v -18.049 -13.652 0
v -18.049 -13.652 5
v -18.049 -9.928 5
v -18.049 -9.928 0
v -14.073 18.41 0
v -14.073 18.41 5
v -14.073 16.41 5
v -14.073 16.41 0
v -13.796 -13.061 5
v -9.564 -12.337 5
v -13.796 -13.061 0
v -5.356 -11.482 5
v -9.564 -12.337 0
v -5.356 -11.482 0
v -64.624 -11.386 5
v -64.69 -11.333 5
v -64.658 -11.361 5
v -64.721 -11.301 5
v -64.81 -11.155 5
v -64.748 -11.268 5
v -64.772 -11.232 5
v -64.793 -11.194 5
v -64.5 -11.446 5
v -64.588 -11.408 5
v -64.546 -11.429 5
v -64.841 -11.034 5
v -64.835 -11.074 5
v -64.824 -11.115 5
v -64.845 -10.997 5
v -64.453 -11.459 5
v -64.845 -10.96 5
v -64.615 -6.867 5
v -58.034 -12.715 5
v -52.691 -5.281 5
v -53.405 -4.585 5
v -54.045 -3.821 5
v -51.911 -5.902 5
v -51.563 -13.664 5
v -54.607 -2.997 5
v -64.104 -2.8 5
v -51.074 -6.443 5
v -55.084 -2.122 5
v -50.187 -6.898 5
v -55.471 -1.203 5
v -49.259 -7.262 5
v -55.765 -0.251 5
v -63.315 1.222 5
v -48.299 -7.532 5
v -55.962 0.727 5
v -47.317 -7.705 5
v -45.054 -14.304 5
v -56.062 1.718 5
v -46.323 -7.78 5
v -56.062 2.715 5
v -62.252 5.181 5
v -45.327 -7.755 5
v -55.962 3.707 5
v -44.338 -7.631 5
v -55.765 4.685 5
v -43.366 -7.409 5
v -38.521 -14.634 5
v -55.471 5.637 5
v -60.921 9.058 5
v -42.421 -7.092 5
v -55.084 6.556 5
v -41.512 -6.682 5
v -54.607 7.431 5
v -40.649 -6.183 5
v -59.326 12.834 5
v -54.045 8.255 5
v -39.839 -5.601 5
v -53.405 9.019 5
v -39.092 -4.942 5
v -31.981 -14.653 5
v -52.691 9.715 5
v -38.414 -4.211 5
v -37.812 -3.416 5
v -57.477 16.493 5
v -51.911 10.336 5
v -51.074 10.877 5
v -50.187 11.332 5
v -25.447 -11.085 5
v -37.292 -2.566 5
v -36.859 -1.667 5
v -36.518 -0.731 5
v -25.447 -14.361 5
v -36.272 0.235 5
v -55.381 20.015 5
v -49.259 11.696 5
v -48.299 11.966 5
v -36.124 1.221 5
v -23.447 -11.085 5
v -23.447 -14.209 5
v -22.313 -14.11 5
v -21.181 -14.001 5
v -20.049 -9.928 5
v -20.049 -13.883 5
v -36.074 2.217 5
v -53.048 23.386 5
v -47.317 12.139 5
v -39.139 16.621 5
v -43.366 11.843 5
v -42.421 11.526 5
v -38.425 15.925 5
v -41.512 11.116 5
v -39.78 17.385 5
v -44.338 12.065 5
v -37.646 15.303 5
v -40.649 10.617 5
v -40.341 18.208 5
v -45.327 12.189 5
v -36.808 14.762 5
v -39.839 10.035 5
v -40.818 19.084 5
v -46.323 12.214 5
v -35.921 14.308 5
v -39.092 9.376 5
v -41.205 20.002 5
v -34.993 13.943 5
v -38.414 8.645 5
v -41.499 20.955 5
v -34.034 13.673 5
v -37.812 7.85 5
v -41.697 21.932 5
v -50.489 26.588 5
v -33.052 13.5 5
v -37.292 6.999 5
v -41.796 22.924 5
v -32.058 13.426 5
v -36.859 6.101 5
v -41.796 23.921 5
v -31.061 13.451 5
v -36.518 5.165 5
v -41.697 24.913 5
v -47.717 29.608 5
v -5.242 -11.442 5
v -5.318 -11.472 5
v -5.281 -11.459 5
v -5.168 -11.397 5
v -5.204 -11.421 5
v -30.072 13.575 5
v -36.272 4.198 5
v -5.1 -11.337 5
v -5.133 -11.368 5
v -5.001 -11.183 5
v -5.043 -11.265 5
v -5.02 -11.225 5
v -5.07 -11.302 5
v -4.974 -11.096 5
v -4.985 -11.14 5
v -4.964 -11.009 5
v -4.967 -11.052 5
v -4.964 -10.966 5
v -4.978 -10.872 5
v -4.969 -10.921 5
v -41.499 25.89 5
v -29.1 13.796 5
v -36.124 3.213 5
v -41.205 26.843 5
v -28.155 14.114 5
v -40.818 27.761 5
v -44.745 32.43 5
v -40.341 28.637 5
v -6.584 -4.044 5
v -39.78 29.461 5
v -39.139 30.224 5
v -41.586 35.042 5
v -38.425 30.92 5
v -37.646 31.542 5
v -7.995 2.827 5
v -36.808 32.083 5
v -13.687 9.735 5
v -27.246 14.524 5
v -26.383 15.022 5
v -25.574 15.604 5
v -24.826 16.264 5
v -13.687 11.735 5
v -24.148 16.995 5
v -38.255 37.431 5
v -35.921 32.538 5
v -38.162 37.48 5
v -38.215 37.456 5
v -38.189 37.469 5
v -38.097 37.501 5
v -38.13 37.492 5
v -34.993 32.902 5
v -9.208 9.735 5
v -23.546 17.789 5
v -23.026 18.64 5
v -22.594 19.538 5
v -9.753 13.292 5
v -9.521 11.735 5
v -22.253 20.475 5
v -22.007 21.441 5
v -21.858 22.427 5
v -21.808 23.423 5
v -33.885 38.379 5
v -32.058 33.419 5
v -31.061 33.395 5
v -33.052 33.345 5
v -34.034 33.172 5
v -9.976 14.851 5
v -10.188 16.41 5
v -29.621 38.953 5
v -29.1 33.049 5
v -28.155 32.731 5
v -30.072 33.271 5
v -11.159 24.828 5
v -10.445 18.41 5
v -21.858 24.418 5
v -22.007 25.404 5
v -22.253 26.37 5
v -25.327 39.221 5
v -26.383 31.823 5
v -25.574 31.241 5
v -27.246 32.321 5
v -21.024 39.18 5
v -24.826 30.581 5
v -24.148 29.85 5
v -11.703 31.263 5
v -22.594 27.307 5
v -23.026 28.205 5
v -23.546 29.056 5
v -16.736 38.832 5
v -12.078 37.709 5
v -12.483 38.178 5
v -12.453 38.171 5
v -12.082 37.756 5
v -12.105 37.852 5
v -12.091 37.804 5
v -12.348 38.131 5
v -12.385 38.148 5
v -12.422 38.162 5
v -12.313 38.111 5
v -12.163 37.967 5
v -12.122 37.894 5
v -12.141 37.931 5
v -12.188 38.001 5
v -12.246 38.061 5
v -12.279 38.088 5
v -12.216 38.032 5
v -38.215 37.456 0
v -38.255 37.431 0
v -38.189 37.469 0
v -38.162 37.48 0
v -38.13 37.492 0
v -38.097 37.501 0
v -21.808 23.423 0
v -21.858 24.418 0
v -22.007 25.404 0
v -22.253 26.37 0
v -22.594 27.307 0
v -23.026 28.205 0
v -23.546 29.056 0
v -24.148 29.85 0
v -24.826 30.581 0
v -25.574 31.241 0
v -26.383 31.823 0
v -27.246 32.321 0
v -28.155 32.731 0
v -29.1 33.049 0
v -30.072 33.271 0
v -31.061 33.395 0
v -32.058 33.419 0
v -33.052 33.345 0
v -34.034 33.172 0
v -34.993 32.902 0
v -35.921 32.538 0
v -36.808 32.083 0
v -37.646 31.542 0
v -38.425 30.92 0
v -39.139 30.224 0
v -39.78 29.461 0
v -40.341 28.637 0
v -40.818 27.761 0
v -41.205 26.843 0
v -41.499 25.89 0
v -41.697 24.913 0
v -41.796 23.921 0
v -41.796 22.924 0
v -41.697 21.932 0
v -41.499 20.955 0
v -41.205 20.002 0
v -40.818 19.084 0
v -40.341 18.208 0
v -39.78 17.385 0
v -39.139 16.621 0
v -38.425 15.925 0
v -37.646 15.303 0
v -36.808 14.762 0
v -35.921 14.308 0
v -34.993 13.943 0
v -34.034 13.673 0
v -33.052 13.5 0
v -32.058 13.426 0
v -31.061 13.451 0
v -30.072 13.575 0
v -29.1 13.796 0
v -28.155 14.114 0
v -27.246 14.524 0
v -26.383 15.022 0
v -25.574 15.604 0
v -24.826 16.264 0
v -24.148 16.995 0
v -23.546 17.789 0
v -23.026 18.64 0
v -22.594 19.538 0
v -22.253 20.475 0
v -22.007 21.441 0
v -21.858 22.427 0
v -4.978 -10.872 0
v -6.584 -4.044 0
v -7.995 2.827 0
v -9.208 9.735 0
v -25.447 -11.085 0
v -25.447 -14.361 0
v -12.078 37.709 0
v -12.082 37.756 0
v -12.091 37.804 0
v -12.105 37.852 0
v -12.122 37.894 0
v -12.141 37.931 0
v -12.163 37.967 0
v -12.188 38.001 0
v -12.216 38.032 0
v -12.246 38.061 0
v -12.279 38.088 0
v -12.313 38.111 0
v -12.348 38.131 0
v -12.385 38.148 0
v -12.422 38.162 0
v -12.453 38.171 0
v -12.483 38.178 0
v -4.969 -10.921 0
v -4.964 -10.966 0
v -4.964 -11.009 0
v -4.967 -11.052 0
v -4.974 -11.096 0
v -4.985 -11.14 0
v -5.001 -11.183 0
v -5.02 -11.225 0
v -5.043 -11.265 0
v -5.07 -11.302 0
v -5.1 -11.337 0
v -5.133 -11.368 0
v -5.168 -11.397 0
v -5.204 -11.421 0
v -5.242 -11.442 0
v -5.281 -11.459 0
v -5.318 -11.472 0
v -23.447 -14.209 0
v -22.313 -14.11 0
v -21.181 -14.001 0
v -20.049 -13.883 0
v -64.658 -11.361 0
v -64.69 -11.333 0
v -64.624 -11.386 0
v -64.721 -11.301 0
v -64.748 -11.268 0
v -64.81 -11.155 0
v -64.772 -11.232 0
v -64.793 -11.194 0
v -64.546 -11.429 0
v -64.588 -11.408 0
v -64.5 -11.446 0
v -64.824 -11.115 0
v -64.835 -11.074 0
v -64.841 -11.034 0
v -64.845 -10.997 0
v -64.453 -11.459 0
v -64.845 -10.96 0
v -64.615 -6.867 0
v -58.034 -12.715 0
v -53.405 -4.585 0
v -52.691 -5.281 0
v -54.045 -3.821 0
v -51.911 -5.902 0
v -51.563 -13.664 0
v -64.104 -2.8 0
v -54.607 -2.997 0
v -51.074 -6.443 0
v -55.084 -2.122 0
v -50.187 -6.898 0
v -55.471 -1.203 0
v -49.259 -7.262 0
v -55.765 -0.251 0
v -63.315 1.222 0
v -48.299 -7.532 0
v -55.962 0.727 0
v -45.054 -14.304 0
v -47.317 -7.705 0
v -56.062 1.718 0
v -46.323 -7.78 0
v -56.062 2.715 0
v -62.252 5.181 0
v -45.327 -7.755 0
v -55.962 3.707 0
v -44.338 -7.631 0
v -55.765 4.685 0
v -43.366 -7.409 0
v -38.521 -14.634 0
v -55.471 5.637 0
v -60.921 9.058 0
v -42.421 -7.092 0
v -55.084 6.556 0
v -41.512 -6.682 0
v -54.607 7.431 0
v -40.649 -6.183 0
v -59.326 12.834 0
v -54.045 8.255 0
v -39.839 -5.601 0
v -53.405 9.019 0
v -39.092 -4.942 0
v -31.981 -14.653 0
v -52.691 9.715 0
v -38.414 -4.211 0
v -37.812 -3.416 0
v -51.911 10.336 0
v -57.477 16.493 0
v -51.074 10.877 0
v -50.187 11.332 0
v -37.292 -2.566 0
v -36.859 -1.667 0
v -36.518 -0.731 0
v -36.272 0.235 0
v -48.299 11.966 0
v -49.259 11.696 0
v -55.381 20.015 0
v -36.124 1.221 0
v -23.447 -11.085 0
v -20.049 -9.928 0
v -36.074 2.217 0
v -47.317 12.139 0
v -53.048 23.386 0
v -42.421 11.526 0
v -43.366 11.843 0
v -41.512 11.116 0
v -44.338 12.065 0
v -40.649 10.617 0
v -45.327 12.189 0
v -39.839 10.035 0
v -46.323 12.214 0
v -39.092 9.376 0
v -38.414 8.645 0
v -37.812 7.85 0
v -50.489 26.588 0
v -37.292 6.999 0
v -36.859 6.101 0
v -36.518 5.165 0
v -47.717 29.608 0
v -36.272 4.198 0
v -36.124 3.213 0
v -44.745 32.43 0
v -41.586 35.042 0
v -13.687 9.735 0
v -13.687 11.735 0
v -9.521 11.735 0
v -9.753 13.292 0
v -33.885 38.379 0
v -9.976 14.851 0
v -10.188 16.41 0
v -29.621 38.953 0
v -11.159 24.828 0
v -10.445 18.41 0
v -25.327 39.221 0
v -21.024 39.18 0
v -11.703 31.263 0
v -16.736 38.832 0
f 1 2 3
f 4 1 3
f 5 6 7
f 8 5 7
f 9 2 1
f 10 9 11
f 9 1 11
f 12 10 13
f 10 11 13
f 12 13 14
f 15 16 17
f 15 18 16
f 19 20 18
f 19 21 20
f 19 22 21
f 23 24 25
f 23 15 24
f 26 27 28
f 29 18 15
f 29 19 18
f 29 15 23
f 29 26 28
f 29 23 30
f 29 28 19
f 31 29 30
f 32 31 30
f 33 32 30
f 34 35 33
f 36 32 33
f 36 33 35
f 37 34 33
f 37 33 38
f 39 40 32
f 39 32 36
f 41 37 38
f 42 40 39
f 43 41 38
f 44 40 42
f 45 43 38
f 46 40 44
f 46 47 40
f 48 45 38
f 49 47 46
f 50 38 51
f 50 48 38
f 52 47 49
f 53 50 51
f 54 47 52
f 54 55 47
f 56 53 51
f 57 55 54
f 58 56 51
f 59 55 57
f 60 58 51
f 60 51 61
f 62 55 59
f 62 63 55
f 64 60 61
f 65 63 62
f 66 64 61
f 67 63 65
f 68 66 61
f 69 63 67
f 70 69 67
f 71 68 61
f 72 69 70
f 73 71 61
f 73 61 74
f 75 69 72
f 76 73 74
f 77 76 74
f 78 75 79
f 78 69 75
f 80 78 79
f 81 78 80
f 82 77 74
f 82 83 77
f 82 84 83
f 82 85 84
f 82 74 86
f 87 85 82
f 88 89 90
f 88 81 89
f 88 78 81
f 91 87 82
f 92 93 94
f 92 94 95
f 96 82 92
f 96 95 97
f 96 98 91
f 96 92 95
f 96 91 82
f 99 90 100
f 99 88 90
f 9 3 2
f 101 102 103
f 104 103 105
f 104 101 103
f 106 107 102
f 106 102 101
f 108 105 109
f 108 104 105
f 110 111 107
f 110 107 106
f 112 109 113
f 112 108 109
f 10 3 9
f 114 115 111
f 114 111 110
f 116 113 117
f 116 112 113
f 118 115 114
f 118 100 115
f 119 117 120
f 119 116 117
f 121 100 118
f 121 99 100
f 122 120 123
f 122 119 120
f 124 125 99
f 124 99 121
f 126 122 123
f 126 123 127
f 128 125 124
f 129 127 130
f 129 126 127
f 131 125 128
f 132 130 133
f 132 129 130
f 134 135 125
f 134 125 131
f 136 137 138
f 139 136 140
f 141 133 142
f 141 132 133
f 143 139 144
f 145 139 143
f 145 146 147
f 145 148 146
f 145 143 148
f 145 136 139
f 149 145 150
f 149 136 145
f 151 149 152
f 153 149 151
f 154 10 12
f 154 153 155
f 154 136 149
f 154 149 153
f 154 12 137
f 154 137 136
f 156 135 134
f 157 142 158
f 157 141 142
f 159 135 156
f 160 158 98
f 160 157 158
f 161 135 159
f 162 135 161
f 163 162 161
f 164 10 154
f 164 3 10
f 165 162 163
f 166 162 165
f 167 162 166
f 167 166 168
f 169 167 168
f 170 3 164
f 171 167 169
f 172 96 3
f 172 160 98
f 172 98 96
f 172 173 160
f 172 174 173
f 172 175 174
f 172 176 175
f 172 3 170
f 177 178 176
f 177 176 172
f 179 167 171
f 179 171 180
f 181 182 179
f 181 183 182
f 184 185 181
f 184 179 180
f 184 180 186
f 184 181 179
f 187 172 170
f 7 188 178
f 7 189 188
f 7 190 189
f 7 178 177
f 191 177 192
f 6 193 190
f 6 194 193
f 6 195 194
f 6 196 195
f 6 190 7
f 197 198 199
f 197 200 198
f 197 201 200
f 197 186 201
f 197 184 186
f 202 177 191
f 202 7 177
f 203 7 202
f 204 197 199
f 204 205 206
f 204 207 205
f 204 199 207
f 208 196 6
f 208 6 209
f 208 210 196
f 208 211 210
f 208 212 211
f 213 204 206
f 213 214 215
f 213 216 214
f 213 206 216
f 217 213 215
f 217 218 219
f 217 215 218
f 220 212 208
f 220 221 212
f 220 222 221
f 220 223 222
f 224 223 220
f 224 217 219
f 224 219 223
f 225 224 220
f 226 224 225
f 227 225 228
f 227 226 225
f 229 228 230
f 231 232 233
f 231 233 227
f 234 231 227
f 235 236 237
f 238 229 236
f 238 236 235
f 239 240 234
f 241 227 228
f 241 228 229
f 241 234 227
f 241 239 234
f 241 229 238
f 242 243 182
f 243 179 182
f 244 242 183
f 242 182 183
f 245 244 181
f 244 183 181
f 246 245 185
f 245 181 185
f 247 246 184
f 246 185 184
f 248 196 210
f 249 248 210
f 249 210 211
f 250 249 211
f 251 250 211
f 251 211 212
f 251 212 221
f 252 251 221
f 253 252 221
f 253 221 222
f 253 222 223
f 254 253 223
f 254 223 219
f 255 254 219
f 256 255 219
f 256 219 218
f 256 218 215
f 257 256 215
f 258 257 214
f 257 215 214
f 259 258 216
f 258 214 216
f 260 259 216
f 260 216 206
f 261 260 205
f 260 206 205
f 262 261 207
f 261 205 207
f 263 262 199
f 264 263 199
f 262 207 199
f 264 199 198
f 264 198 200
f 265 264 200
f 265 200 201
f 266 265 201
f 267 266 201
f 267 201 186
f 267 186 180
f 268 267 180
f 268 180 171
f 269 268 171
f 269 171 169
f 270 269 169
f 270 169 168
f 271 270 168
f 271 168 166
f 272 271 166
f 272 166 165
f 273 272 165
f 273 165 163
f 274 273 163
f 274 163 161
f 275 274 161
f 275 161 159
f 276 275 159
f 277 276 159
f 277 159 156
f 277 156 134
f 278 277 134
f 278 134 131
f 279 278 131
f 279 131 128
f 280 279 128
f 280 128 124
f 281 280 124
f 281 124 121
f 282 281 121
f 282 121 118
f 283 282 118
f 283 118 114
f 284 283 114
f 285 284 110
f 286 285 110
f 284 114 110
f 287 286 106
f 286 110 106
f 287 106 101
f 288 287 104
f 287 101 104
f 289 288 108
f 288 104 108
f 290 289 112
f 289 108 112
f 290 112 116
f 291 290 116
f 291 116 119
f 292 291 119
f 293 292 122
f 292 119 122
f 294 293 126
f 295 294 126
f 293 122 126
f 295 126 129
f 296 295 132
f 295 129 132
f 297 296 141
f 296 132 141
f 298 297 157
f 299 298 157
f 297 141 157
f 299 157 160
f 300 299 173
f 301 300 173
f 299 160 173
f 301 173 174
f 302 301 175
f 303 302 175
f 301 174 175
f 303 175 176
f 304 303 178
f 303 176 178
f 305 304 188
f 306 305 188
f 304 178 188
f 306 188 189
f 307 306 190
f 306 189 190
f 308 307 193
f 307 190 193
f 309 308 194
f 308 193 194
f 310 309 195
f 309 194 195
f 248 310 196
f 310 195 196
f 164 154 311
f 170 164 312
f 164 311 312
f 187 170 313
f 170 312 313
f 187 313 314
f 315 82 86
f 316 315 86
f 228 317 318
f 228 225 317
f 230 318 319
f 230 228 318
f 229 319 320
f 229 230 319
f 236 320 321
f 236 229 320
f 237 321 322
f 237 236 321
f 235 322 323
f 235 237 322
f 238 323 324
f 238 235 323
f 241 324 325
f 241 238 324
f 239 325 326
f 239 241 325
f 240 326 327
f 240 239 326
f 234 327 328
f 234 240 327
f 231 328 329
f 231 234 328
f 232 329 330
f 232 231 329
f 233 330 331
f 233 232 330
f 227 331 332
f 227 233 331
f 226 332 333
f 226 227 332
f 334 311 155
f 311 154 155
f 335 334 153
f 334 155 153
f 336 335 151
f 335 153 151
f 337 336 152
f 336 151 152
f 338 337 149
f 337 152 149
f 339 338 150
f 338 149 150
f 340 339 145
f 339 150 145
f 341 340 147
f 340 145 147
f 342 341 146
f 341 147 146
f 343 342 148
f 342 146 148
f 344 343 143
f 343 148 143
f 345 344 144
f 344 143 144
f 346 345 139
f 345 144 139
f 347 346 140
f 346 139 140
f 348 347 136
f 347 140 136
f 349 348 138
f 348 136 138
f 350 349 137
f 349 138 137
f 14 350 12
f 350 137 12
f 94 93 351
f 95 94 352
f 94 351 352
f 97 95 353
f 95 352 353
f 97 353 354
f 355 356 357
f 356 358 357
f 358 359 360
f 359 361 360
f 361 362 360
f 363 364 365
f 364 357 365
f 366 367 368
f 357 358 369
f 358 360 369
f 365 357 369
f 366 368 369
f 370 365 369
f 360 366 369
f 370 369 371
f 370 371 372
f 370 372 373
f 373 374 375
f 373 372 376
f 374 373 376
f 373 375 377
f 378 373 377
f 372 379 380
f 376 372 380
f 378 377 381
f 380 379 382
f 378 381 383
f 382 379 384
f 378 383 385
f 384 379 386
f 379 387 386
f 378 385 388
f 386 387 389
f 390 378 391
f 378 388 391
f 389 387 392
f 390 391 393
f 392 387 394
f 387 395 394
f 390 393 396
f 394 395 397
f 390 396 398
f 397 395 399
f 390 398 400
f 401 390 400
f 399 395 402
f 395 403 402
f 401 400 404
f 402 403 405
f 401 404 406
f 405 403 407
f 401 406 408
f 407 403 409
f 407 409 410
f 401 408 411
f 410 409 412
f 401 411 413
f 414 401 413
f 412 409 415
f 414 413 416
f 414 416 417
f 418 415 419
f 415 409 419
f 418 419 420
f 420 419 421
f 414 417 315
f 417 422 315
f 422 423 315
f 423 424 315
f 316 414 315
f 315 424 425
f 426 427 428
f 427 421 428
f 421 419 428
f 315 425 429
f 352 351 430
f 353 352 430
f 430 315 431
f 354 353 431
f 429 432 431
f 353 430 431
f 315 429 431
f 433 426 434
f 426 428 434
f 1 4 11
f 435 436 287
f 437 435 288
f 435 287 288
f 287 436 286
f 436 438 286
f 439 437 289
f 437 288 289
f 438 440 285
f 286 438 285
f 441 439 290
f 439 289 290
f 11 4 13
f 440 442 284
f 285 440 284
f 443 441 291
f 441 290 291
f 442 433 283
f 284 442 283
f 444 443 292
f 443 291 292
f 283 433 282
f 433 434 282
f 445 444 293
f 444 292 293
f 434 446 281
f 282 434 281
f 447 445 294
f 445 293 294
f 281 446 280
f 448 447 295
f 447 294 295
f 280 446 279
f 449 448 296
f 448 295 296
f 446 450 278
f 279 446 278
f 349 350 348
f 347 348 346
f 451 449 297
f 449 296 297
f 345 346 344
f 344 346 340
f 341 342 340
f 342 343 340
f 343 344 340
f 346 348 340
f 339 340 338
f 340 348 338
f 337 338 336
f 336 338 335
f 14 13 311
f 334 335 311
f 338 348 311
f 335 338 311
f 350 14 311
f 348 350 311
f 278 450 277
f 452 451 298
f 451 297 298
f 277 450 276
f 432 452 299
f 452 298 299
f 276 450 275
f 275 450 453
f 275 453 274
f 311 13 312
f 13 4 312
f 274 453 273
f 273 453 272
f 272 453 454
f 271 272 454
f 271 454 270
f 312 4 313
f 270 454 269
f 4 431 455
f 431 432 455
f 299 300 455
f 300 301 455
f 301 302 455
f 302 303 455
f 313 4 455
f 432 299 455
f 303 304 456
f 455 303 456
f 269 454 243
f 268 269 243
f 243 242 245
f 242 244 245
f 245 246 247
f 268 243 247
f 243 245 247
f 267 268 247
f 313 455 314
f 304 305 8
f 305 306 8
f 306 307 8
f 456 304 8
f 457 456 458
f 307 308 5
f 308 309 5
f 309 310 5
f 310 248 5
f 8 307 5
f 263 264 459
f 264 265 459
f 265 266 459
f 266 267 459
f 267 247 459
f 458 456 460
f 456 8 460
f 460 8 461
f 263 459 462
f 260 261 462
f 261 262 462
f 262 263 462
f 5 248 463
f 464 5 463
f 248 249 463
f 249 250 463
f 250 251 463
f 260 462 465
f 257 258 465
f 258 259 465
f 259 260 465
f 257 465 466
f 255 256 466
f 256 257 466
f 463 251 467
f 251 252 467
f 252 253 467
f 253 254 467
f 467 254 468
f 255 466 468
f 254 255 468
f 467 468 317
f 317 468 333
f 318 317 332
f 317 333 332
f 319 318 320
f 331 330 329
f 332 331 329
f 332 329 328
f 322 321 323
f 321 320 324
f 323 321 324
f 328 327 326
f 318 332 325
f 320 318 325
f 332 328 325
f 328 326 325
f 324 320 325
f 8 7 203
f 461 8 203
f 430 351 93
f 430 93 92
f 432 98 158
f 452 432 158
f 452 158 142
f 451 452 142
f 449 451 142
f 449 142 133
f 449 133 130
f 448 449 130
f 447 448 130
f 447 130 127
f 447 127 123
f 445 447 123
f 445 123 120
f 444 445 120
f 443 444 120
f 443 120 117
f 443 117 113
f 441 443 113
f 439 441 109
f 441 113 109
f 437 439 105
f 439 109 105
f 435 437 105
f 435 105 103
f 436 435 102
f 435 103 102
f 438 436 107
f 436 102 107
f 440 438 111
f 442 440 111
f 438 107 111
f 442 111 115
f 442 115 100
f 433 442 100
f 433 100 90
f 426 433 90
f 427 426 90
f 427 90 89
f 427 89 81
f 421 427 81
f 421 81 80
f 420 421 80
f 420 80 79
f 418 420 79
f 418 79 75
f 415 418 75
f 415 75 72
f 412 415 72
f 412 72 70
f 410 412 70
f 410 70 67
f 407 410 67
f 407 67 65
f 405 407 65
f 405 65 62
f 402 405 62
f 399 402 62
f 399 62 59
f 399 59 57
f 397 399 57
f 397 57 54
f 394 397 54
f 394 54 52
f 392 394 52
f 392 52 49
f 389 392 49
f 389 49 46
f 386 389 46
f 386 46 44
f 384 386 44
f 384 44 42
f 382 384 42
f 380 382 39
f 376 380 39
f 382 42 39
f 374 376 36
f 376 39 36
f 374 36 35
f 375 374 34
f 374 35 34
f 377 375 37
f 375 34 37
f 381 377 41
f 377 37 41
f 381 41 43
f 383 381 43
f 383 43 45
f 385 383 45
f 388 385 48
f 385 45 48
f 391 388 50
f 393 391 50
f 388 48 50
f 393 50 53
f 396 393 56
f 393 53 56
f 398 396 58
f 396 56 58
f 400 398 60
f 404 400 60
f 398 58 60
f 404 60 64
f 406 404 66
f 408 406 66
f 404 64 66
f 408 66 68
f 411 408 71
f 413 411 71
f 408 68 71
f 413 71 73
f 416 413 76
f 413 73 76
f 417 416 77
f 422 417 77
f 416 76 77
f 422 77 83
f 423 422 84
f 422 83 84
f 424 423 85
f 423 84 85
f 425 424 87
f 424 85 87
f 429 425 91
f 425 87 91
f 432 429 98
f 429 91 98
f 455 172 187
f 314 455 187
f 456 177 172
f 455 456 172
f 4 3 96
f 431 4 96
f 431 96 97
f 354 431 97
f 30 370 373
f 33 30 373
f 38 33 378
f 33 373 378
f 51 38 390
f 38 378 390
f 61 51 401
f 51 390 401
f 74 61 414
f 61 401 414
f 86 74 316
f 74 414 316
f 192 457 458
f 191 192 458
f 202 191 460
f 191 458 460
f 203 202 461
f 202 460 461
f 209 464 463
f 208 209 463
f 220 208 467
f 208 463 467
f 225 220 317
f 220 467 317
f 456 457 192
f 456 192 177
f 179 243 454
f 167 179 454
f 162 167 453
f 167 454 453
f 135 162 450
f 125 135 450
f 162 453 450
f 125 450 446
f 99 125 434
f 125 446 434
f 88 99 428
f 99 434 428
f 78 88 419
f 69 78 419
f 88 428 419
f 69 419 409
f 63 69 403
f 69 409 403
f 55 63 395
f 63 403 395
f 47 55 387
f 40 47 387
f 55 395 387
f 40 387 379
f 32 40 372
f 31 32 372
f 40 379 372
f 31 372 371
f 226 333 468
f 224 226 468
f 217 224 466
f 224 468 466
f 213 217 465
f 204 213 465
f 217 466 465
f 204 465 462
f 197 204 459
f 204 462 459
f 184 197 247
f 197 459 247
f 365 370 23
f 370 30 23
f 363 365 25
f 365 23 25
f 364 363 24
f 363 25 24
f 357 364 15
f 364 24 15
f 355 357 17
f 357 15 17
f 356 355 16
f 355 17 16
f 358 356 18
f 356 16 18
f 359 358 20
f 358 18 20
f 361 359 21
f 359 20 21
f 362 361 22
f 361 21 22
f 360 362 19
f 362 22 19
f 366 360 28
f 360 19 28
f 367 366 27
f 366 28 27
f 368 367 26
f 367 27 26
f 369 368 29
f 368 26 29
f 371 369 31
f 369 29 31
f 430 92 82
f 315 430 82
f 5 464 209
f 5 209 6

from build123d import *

# Parameters (mm, degrees)
F1_DEPTH = 5
F3_DEPTH = 25
F5_R     = 10
F6_DEPTH = 40.2
F7_R     = 0.5


with BuildPart() as f1:
    # F0 (on Top) → F1 (new body)
    with BuildSketch(Plane.XY):
        with BuildLine():
            ThreePointArc((-4.8529455066, -11.3703208044), (-9.7372457817, 13.1811290021), (-12.094983449, 38.1024281231))
            ThreePointArc((-12.094983449, 38.1024281231), (-25.1726018808, 39.2244660439), (-38.1818190217, 37.4799482524))
            ThreePointArc((-38.1818190217, 37.4799482524), (-57.5543992317, 16.3508865245), (-64.8529455066, -11.3703208044))
            ThreePointArc((-64.8529455066, -11.3703208044), (-34.8529455066, -14.6827008575), (-4.8529455066, -11.3703208044))
        make_face()
    extrude(amount=F1_DEPTH)

    # F2 (on face) → F3 (cut)
    with BuildSketch(Plane.XY.offset(5)):
        with BuildLine():
            Line((-10.445380618, 18.4103436768), (-14.0728279948, 18.4103436768))
            Line((-14.0728279948, 18.4103436768), (-14.0728279948, 16.4103436768))
            Line((-14.0728279948, 16.4103436768), (-10.1880609939, 16.4103436768))
            ThreePointArc((-10.1880609939, 16.4103436768), (-10.3187750863, 17.4100793735), (-10.445380618, 18.4103436768))
        make_face()
        with BuildLine():
            ThreePointArc((-9.2078046903, 9.7353123128), (-9.3665647814, 10.7349891474), (-9.521200175, 11.7353123128))
            Line((-9.521200175, 11.7353123128), (-13.6872706935, 11.7353123128))
            Line((-13.6872706935, 11.7353123128), (-13.6872706935, 9.7353123128))
            Line((-13.6872706935, 9.7353123128), (-9.2078046903, 9.7353123128))
        make_face()
        with BuildLine():
            Line((-25.4467576742, -11.0847614706), (-25.4467576742, -14.3606151844))
            ThreePointArc((-25.4467576742, -14.3606151844), (-24.4464809139, -14.2883663577), (-23.4467576742, -14.2088243302))
            Line((-23.4467576742, -14.2088243302), (-23.4467576742, -11.0847614706))
            Line((-23.4467576742, -11.0847614706), (-25.4467576742, -11.0847614706))
        make_face()
        with BuildLine():
            ThreePointArc((-20.0489610434, -13.8834992945), (-19.0485375374, -13.7714603365), (-18.0489610434, -13.6521005786))
            Line((-18.0489610434, -13.6521005786), (-18.0489610434, -9.9280904979))
            Line((-18.0489610434, -9.9280904979), (-20.0489610434, -9.9280904979))
            Line((-20.0489610434, -9.9280904979), (-20.0489610434, -13.8834992945))
        make_face()
    extrude(amount=-F3_DEPTH, mode=Mode.SUBTRACT)

    # F5 (on face) → F6 (cut)
    with BuildSketch(Plane.XY.offset(5)):
        with Locations((-46.07405141, 2.2169523872)):
            Circle(F5_R)
        with Locations((-31.8084470928, 23.4225839376)):
            Circle(F5_R)
    extrude(amount=-F6_DEPTH, mode=Mode.SUBTRACT)

    # F7
    f7_edges = [f1.edges().sort_by_distance(p)[0] for p in [
        (-4.852946, -11.370321, 2.5),
        (-64.852946, -11.370321, 2.5),
        (-12.094983, 38.102428, 2.5),
        (-38.181819, 37.479948, 2.5),
    ]]
    fillet(f7_edges, radius=F7_R)


solid = f1.part
